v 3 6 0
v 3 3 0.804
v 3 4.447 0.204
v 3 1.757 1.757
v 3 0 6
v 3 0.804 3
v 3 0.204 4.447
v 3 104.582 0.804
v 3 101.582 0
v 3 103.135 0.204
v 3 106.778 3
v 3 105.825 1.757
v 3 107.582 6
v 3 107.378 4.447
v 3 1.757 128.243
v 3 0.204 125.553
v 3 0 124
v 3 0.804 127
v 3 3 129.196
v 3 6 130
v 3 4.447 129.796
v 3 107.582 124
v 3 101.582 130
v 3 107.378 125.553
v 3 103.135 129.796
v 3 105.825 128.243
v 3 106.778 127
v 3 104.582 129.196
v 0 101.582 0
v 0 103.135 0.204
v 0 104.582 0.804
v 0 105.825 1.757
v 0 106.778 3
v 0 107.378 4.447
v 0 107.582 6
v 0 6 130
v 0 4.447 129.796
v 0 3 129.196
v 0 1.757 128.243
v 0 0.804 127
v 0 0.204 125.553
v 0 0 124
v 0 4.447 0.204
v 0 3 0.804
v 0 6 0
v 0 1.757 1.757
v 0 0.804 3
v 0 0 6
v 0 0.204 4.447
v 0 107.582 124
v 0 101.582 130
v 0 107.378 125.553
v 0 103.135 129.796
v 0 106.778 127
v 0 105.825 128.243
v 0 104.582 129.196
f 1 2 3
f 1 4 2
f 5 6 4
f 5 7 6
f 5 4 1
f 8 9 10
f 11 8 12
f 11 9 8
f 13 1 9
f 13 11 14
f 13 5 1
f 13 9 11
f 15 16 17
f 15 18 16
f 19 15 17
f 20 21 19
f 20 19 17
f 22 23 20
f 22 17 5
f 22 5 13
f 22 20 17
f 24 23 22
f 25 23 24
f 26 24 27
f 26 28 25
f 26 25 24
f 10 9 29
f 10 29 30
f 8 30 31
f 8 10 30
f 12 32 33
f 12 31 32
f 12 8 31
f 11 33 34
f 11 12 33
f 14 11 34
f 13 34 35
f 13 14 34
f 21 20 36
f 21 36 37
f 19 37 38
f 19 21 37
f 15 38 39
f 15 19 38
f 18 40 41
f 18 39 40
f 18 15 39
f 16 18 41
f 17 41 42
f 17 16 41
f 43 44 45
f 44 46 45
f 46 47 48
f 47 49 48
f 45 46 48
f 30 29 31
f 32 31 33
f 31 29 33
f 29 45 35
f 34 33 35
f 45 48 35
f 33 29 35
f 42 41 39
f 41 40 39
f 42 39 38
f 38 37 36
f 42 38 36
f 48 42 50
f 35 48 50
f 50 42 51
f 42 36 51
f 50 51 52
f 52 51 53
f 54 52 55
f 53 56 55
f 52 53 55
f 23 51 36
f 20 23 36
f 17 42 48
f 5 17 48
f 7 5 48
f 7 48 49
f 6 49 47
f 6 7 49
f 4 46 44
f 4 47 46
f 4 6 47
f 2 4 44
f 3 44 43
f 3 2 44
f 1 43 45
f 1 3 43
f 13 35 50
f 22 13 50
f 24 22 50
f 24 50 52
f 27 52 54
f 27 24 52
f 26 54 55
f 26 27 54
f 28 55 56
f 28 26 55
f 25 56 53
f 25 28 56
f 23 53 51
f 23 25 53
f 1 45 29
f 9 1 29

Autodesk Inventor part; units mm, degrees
ref_plane "YZ Plane" through (0, 0, 0) normal (1, 0, 0) x (0, 1, 0)
ref_plane "XZ Plane" through (0, 0, 0) normal (0, 1, 0) x (-1, 0, 0)
ref_plane "XY Plane" through (0, 0, 0) normal (0, 0, 1) x (1, 0, 0)
sketch "Sketch1" plane through (0, 0, 0) normal (1, 0, 0) x (0, 1, 0)
  line L0 (107.582, 130) -> (0, 130)
  line L1 (0, 130) -> (0, 0)
  line L2 (0, 0) -> (107.582, 0)
  line L3 (107.582, 0) -> (107.582, 130)
  dimension "d0" = 130
  dimension "d1" = 107.582
extrude "Plate1" add sketch "Sketch1" along normal blind 3
fillet "Corner Round1" radius 6 4 edges at (1.5, 107.582, 130) (1.5, 107.582, 0) (1.5, 0, 130) (1.5, 0, 0)
equation "\"d2\" = Thickness"
equation "\"BendReliefWidth\" = Thickness"
equation "\"BendReliefDepth\" = 0.5 * Thickness"
equation "\"CornerReliefSize\" = 4 * Thickness"
equation "\"MinimumRemnant\" = 2 * Thickness"
equation "\"TransitionRadius\" = BendRadius"
equation "\"JacobiRadiusSize\" = BendRadius"
equation "\"GapSize\" = Thickness"
equation "\"Thickness\" = 3"
equation "\"BendRadius\" = 5"
properties part number "MSC 802 bottom plate gills" material "Stainless Steel"
